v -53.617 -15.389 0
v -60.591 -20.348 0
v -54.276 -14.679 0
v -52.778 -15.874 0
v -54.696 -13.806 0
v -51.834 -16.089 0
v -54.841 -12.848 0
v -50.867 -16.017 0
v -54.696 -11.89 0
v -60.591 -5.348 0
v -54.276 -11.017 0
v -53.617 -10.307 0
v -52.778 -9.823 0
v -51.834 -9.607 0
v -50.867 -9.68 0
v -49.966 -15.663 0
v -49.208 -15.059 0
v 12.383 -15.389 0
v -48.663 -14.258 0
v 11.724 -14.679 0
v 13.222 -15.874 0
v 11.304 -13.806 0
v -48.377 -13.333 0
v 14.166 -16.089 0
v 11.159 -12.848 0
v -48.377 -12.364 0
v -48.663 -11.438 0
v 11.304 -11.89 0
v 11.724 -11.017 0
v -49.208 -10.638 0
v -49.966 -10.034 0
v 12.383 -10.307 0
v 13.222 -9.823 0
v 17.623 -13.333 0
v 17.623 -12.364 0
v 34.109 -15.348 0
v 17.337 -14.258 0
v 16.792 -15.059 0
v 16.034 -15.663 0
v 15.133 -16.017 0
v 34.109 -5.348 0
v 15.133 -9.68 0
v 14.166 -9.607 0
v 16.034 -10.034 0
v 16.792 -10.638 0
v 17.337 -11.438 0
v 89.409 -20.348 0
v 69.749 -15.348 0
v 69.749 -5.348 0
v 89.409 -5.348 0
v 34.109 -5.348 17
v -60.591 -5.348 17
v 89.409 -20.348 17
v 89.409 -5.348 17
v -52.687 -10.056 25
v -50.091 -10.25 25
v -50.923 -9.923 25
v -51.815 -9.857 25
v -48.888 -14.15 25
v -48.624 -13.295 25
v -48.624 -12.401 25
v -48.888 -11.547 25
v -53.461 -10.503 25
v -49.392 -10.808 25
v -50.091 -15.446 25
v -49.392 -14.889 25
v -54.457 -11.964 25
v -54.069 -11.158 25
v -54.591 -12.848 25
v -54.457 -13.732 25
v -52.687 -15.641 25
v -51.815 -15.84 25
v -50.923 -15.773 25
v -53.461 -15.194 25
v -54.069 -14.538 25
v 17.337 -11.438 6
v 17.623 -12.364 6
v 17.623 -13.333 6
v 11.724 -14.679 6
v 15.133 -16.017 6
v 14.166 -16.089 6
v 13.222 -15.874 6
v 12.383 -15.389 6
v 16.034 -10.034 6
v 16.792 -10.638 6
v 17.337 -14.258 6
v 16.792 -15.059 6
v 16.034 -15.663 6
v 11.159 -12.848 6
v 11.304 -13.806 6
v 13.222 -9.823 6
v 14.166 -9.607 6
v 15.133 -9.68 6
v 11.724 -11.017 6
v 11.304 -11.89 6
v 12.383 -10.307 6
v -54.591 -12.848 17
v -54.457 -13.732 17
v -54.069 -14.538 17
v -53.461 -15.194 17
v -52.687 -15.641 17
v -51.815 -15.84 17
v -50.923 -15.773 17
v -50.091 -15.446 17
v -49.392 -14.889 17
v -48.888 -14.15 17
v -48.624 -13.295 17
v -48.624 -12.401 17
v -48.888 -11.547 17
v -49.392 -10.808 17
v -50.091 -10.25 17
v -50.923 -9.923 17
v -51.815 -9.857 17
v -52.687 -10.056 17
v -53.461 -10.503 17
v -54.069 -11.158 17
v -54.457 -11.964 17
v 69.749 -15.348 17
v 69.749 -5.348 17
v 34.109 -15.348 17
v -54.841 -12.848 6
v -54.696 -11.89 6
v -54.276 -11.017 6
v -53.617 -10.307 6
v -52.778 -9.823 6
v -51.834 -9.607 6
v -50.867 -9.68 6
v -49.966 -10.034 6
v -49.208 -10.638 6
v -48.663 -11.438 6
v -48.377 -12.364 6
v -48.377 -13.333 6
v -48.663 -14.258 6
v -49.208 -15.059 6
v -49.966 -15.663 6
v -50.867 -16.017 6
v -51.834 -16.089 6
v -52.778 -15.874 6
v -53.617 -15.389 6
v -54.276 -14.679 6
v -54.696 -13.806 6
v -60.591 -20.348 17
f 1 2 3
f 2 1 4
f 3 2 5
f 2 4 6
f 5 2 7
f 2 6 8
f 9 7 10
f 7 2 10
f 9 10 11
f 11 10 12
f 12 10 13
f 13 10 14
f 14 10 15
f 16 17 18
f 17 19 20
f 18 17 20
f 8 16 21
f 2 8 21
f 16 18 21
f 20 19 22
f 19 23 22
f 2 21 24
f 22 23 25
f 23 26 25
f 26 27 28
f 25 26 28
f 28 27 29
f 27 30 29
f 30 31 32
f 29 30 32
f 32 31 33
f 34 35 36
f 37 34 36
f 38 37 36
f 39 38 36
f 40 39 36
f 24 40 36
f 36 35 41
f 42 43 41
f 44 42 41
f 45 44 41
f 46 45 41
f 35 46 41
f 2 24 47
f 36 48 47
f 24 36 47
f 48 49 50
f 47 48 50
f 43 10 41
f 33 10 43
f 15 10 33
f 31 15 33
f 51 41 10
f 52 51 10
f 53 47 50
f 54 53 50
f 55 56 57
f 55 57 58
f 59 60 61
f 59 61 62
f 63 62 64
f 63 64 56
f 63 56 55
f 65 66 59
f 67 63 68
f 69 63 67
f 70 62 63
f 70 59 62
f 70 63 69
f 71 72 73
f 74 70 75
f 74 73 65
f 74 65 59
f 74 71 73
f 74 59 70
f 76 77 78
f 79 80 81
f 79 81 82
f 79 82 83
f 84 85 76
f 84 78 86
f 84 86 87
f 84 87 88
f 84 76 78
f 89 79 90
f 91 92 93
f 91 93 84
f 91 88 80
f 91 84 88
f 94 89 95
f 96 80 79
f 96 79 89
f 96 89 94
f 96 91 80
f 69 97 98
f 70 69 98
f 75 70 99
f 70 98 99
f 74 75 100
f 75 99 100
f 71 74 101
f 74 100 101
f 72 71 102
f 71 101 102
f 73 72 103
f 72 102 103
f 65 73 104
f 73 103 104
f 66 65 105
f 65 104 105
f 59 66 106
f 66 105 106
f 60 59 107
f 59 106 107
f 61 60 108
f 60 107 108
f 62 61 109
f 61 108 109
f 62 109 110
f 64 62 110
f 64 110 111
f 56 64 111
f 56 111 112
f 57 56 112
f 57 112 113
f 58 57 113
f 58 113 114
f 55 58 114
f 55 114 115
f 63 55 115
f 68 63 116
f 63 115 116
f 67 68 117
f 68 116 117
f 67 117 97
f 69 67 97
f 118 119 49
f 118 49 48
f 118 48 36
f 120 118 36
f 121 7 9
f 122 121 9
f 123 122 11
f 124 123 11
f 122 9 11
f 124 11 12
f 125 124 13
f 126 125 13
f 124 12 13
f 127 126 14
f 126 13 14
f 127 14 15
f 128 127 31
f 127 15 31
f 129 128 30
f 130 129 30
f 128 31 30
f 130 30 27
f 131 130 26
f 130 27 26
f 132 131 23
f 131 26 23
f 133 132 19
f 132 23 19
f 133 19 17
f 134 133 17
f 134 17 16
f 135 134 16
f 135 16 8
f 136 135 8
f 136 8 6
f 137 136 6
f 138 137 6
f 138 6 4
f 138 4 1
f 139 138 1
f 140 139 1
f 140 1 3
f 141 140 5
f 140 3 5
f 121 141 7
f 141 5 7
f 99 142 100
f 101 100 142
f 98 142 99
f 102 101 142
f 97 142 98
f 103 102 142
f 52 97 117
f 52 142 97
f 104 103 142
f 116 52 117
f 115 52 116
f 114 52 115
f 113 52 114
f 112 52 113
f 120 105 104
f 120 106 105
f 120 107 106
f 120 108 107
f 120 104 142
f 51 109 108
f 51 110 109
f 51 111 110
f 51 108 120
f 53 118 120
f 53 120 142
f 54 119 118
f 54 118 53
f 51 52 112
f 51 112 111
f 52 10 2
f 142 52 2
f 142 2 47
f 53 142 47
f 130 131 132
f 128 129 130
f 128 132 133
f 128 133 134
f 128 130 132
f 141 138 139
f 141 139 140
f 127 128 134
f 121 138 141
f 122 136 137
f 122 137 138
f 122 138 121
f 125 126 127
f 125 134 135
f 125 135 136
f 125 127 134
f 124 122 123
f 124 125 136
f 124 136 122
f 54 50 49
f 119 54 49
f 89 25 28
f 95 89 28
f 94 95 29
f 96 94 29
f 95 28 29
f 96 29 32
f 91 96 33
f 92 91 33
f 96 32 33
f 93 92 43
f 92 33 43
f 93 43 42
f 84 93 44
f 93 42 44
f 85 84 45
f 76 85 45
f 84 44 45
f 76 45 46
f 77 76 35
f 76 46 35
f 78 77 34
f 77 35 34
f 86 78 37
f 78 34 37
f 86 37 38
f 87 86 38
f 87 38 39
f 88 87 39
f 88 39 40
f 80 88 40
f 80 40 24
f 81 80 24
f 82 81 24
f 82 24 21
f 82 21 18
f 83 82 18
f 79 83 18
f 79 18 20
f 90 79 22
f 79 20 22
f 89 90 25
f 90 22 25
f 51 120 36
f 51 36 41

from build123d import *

# Parameters (mm, degrees)
BOSS_EXTRUDE1_DEPTH = 17
SKETCH3_R           = 3.25
CUT_EXTRUDE1_DEPTH  = 6
SKETCH4_R           = 3
BOSS_EXTRUDE2_DEPTH = 8


with BuildPart() as part:
    # Sketch2 → Boss-Extrude1 (new body)
    with BuildSketch(Plane.XY):
        Polygon((-60.590688259, -20.348178138), (89.409311741, -20.348178138), (89.409311741, -5.348178138), (69.749311741, -5.348178138), (69.749311741, -15.348178138), (34.109311741, -15.348178138), (34.109311741, -5.348178138), (-60.590688259, -5.348178138), align=None)
    extrude(amount=BOSS_EXTRUDE1_DEPTH)

    # Sketch3 → Cut-Extrude1 (cut)
    with BuildSketch(Plane(origin=(0, 0, 0), x_dir=(-1, 0, 0), z_dir=(0, 0, -1))):
        with Locations((-14.409311741, -12.848178138)):
            Circle(SKETCH3_R)
        with Locations((51.590688259, -12.848178138)):
            Circle(SKETCH3_R)
    extrude(amount=-CUT_EXTRUDE1_DEPTH, mode=Mode.SUBTRACT)

    # Sketch4 → Boss-Extrude2 (add)
    with BuildSketch(Plane.XY.offset(17)):
        with Locations((-51.590688259, -12.848178138)):
            Circle(SKETCH4_R)
    extrude(amount=BOSS_EXTRUDE2_DEPTH)


solid = part.part
